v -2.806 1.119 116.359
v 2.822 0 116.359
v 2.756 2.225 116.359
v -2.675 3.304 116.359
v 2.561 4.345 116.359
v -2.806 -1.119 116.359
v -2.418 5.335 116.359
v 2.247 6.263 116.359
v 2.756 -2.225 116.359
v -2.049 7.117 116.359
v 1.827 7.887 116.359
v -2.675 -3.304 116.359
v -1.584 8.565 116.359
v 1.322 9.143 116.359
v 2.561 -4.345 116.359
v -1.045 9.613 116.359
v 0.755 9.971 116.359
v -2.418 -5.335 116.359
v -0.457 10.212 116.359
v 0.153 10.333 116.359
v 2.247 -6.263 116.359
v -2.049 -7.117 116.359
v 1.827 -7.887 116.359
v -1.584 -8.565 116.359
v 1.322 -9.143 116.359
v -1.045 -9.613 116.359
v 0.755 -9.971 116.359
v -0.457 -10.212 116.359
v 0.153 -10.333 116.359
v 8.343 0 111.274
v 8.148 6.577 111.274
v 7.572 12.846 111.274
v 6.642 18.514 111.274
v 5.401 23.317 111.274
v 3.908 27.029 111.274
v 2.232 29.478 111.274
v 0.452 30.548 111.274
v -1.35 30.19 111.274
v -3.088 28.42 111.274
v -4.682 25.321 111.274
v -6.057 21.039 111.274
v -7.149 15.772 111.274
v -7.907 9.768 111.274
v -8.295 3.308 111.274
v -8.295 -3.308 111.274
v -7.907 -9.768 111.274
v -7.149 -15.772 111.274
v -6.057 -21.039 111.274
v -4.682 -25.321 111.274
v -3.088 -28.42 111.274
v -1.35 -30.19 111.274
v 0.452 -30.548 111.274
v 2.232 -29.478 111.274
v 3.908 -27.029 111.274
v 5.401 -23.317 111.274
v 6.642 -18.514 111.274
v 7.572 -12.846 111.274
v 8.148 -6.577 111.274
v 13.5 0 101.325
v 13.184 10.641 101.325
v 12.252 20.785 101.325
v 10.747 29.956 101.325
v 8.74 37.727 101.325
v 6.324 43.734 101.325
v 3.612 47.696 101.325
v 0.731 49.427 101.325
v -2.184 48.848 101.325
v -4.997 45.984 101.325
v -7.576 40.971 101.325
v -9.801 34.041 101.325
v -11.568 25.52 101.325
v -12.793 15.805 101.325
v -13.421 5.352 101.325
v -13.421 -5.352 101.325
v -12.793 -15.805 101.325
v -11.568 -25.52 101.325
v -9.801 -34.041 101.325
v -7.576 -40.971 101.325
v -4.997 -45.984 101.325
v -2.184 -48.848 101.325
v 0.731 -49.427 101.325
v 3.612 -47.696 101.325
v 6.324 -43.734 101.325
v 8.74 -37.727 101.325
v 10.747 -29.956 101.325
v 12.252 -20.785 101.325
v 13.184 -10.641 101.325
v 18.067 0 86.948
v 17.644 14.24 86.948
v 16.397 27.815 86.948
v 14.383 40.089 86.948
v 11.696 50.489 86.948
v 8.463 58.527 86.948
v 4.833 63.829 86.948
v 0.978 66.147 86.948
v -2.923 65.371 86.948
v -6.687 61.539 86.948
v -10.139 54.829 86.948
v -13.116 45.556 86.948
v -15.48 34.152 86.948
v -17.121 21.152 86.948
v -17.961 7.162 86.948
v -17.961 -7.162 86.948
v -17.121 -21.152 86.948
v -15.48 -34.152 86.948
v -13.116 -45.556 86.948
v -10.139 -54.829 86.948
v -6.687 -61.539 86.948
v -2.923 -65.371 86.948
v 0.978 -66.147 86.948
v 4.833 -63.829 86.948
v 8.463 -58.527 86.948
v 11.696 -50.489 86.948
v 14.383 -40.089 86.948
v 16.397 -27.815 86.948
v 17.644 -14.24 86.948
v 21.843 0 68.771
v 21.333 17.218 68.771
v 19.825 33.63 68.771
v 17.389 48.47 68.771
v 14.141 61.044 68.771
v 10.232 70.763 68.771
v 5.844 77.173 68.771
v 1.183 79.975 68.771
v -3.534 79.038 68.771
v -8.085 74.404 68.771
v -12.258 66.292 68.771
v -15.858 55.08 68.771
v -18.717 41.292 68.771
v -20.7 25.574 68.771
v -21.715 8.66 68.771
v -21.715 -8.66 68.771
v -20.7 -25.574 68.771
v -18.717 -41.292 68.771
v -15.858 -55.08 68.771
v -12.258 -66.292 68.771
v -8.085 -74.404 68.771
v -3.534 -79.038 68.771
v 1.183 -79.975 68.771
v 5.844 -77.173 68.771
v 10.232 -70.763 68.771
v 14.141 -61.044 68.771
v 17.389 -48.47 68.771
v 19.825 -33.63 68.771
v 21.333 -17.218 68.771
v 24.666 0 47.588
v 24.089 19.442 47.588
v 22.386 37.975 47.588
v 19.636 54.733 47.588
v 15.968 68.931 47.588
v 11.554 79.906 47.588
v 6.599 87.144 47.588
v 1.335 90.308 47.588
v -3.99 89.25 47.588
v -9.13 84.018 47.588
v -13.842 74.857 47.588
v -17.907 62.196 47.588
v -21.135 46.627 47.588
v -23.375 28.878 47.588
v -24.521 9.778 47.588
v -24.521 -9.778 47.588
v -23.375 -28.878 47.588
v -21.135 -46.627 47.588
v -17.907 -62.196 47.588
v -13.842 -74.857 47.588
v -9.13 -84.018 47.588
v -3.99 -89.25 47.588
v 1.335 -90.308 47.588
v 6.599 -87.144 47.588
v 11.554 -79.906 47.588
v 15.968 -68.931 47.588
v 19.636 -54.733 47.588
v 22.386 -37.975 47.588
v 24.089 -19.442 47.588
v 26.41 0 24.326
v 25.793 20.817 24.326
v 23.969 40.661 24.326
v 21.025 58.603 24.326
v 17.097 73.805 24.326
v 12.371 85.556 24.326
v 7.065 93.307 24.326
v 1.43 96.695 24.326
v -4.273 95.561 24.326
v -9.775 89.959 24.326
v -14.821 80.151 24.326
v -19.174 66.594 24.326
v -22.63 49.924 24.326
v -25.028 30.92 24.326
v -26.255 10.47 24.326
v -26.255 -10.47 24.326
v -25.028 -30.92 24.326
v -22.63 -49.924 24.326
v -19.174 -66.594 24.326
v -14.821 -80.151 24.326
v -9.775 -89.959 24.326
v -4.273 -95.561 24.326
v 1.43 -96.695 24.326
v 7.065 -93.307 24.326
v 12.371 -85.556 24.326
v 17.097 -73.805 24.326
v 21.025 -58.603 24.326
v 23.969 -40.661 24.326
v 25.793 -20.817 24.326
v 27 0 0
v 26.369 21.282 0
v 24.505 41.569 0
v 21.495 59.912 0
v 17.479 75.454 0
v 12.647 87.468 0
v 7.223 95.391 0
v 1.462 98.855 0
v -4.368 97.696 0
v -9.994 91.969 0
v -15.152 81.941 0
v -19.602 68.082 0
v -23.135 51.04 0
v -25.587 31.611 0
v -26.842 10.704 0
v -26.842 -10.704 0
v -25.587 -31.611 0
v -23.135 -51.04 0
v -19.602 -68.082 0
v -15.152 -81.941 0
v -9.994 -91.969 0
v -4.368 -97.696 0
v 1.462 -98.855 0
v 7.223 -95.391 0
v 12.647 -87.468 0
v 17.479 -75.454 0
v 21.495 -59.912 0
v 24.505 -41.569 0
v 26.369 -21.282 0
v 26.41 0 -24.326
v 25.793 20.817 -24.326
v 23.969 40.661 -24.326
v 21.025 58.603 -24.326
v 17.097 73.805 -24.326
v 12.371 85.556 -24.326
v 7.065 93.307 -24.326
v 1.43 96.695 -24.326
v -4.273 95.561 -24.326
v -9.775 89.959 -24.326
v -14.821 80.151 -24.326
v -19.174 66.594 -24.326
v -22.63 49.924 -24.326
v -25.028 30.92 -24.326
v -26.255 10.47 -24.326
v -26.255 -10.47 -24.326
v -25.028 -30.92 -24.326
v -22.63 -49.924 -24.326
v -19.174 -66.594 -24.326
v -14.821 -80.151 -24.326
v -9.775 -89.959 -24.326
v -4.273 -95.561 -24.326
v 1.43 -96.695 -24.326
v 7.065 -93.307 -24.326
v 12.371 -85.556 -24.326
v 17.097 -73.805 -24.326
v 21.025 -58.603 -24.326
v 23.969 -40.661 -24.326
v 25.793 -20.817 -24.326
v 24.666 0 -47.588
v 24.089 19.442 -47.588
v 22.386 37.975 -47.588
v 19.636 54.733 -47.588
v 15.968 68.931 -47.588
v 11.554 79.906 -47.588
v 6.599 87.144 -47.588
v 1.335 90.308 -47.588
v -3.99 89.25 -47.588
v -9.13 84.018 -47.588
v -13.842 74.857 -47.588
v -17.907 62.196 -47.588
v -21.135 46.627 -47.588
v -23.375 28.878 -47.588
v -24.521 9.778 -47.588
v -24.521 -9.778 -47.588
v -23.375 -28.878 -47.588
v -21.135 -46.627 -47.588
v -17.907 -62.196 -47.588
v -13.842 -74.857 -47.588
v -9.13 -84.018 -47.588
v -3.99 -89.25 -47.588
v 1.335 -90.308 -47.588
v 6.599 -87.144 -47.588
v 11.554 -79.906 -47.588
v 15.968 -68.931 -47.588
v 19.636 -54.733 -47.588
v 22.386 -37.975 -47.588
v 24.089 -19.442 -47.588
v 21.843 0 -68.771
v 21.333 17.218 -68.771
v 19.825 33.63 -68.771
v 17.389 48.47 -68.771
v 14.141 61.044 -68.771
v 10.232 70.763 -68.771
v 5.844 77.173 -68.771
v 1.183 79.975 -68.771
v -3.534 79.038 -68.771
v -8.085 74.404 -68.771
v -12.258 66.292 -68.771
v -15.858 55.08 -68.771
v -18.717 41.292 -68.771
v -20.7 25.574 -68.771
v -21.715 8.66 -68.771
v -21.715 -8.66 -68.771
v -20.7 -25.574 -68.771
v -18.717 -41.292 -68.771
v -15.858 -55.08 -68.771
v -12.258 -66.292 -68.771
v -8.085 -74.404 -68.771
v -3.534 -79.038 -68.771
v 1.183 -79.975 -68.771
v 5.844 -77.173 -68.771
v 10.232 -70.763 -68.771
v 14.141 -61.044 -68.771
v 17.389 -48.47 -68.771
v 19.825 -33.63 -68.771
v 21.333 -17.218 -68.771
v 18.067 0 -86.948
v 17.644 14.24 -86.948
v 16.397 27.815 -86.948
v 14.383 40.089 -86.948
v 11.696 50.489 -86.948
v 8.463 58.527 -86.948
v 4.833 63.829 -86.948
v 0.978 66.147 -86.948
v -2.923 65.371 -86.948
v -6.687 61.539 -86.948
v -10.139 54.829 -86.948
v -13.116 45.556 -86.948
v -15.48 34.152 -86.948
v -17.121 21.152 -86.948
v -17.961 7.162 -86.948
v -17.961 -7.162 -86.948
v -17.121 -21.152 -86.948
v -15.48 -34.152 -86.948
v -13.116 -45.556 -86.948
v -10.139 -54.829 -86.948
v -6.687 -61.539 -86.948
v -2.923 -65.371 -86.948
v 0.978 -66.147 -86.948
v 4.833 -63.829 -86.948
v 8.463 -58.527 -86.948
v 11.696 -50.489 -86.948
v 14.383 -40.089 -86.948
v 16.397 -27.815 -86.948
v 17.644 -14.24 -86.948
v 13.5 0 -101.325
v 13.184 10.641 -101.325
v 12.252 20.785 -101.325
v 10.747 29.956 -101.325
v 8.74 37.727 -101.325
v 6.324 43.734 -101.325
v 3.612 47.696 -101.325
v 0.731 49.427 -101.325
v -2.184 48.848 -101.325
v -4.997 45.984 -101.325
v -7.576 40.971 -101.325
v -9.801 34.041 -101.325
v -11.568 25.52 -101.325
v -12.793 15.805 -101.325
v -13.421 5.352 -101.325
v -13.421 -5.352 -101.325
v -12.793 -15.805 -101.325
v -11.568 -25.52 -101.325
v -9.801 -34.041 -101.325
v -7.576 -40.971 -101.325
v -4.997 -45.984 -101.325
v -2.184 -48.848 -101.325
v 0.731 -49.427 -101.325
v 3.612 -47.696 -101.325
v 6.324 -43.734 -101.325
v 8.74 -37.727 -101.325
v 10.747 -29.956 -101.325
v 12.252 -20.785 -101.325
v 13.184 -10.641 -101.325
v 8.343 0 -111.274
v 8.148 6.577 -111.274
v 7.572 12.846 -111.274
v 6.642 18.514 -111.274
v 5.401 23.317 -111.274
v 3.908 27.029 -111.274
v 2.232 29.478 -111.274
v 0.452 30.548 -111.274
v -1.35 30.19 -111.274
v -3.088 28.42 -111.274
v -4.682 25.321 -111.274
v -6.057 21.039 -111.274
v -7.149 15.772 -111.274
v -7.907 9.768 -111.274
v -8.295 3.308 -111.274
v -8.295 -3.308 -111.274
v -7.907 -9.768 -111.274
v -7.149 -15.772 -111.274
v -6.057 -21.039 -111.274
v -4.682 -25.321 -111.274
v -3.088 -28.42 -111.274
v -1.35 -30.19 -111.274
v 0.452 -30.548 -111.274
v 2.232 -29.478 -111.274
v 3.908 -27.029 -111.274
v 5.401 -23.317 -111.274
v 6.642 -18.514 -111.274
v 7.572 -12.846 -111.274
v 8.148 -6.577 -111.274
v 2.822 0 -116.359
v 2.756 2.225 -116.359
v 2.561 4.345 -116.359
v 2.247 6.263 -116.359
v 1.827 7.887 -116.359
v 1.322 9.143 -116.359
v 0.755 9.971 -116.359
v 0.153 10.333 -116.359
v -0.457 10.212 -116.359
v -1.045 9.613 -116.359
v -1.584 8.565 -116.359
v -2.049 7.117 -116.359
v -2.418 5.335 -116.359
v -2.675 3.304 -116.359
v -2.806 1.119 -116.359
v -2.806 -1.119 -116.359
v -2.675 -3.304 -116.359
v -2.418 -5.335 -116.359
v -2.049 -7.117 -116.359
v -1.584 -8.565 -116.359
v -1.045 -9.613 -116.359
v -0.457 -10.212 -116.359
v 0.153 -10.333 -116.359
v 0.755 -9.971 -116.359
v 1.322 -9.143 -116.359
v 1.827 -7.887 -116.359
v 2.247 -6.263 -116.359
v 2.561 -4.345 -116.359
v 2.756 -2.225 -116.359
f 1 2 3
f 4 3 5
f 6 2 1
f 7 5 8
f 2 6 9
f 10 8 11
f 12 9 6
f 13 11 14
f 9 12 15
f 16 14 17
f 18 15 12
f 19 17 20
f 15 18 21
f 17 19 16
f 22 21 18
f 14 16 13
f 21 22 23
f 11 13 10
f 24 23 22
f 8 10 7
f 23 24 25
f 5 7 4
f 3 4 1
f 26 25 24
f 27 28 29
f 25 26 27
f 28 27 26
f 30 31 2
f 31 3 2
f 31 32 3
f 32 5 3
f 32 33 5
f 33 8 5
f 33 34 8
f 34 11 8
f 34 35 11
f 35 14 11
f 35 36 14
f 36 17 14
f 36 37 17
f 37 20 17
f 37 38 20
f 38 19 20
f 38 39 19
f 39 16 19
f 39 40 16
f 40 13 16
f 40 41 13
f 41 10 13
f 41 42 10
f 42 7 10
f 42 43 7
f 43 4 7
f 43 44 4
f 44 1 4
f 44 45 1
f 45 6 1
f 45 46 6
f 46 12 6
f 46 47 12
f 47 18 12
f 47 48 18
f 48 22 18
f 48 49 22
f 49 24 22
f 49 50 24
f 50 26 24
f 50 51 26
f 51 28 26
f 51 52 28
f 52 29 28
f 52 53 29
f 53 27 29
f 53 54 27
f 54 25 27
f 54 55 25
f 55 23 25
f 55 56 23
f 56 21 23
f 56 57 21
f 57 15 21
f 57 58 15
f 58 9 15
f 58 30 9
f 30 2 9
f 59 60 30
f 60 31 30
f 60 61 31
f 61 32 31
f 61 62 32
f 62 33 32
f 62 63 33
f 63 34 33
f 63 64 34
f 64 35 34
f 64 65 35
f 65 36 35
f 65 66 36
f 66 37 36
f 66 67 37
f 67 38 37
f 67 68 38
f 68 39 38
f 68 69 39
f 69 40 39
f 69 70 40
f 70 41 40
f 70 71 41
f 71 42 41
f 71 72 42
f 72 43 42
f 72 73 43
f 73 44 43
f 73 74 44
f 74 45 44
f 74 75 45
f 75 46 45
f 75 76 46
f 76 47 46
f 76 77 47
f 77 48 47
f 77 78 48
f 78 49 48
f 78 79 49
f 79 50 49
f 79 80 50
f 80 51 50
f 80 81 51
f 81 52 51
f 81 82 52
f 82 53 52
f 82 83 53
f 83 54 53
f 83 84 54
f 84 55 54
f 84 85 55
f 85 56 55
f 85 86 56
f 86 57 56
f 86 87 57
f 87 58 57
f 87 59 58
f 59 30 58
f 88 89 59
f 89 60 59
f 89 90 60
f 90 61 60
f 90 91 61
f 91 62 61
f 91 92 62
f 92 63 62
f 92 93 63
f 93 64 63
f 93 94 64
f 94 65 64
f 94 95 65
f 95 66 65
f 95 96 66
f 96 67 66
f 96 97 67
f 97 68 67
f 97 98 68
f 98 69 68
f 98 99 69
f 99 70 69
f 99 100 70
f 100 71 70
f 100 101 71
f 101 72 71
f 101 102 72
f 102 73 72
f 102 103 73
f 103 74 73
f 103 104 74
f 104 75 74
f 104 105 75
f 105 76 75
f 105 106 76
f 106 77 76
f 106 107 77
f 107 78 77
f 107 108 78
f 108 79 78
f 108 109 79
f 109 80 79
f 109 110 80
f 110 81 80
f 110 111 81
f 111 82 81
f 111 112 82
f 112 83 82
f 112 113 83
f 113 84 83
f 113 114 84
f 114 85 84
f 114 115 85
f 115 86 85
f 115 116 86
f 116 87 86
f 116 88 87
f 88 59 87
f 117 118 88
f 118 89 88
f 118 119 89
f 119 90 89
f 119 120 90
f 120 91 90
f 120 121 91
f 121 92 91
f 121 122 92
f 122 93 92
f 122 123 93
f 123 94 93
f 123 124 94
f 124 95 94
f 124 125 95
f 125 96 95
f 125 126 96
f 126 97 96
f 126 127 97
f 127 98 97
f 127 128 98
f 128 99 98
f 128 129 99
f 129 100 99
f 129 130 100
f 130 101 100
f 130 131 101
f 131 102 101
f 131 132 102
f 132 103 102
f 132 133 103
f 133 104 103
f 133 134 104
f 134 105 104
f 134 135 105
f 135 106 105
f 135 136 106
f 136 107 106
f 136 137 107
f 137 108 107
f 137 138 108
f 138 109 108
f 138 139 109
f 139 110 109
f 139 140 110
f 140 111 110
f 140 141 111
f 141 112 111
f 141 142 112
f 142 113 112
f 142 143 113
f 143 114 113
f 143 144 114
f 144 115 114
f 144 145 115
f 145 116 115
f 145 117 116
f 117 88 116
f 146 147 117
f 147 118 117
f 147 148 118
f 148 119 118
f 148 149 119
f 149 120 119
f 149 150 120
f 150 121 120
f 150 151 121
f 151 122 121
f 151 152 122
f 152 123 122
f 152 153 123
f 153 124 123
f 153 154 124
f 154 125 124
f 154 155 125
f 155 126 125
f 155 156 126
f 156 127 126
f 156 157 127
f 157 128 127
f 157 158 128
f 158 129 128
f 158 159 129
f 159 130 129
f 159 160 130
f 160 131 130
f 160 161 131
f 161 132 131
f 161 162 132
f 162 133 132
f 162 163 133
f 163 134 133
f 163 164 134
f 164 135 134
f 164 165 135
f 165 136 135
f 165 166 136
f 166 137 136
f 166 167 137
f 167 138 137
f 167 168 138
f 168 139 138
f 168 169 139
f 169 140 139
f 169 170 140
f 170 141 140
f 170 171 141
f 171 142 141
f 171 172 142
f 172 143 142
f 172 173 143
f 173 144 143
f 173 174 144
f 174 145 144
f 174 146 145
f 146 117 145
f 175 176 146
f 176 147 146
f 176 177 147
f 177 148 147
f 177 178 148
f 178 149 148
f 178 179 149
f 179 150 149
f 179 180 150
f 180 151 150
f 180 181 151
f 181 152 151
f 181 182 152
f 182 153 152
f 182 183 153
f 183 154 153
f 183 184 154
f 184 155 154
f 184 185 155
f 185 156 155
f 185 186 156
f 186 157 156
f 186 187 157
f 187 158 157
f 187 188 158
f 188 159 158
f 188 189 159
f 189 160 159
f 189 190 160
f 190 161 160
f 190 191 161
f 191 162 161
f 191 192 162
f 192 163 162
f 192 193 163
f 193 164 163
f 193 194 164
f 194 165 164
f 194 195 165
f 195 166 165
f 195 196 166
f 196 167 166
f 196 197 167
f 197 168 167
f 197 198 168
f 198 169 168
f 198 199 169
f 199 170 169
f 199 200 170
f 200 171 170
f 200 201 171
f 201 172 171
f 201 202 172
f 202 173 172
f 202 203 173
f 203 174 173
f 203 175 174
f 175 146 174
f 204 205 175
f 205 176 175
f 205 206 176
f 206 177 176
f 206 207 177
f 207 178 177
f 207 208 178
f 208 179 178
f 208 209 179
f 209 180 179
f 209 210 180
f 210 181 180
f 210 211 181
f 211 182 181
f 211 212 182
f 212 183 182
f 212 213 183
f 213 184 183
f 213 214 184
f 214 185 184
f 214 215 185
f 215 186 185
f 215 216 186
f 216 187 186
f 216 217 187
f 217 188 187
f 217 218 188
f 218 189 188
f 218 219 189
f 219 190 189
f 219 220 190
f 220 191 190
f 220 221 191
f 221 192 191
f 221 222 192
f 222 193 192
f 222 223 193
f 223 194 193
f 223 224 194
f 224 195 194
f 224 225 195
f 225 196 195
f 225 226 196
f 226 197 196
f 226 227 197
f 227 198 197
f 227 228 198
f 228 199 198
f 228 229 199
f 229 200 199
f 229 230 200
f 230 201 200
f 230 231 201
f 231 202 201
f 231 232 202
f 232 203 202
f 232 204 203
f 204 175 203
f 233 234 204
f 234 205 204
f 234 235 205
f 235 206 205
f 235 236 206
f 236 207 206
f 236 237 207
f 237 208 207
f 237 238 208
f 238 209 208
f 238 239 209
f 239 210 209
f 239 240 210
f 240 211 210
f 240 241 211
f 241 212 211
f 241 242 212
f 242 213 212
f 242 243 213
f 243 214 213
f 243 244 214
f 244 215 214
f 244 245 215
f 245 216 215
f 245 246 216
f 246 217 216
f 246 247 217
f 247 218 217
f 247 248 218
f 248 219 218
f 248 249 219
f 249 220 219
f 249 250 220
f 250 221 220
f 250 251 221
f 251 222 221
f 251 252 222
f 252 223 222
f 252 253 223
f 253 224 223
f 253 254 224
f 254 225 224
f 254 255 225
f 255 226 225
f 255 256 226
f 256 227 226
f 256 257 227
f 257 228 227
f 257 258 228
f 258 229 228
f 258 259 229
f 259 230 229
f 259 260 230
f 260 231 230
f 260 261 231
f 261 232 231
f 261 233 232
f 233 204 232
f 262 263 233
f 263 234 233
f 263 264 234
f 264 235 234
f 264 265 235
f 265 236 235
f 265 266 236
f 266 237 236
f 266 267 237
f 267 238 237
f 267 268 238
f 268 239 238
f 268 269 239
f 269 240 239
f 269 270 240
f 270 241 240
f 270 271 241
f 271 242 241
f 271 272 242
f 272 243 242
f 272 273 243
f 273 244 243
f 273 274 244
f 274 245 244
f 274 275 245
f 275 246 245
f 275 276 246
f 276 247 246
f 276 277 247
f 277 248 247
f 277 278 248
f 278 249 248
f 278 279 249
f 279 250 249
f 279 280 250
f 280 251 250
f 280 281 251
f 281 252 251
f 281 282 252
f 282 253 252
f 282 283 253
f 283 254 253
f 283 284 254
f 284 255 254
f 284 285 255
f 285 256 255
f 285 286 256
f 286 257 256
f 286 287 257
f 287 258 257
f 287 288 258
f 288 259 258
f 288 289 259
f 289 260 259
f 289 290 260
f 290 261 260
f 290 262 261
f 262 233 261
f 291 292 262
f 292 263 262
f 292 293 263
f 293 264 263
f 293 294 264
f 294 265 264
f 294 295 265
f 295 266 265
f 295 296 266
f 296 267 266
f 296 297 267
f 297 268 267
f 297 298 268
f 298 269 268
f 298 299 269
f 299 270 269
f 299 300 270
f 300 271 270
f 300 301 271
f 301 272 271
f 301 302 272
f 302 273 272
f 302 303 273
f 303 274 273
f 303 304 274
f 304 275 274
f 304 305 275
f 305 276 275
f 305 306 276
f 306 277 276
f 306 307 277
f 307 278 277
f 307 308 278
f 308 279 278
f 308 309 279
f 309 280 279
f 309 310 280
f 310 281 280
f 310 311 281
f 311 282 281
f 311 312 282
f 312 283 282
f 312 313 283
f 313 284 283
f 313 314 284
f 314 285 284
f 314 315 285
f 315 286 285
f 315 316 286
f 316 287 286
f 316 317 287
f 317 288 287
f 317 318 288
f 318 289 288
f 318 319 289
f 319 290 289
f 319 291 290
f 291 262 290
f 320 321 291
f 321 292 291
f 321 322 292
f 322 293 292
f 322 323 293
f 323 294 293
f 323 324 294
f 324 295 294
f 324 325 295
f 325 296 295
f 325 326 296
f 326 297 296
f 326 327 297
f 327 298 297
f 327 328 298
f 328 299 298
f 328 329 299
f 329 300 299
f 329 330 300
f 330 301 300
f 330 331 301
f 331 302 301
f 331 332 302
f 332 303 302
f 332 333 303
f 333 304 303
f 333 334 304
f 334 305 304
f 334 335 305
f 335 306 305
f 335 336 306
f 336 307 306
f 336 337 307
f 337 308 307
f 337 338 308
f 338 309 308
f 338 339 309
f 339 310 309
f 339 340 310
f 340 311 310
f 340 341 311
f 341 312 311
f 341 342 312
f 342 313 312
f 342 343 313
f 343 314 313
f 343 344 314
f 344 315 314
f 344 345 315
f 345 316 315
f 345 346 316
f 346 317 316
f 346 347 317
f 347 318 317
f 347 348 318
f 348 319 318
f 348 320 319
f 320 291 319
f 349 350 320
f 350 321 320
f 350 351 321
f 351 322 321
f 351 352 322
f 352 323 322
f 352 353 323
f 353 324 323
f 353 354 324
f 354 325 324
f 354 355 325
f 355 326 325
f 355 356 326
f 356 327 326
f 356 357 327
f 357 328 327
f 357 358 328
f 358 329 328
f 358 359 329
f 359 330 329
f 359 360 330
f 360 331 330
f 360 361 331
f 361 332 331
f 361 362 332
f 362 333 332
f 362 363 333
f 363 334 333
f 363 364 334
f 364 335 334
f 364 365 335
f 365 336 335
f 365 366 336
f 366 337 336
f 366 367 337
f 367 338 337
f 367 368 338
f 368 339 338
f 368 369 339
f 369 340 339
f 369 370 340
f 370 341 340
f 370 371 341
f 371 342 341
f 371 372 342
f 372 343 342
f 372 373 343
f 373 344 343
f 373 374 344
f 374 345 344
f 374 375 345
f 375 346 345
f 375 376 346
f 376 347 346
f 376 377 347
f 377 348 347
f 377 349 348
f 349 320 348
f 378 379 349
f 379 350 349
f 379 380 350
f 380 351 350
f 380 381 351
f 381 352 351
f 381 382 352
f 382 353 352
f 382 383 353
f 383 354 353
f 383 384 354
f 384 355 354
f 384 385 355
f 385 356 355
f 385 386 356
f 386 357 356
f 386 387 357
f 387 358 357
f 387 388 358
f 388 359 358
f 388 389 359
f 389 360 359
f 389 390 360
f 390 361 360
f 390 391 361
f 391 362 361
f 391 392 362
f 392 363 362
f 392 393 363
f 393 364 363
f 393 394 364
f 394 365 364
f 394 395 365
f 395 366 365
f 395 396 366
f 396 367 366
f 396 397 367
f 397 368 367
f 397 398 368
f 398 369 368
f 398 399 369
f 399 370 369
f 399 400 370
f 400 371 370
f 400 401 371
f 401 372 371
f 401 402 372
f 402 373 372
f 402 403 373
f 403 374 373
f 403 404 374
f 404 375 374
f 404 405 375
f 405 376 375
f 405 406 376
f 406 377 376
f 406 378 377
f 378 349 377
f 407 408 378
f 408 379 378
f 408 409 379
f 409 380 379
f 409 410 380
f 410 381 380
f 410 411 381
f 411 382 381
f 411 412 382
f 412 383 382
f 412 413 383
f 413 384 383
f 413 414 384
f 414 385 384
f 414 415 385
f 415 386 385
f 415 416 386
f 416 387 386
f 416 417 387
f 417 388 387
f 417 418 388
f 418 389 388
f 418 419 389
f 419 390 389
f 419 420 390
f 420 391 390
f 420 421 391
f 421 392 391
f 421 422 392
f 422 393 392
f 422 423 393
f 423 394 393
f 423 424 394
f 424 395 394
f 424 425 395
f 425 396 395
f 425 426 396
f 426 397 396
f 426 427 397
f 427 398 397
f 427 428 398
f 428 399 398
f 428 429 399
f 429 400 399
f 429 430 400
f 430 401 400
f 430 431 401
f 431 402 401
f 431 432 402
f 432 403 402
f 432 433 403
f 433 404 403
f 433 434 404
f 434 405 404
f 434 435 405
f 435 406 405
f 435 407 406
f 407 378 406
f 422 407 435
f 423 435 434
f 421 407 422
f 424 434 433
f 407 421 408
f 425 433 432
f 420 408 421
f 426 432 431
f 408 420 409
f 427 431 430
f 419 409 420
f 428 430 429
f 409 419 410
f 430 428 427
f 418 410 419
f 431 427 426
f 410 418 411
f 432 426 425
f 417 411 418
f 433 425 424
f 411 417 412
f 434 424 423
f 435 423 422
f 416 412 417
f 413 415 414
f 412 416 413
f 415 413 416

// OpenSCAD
// Generated by SolidPython 1.0.1 on 2020-07-29 00:46:45


scale(v = [3, 11, 13]) {
	sphere(r = 9);
}
/***********************************************
*********      SolidPython code:      **********
************************************************
 
# import packages: SolidPython
from solid import *
from solid.utils import *
from itertools import chain, combinations, permutations


class Resize:

    def __init__(self, scad_file):
        self.scad_file = scad_file
        #self.scad_file = import_scad(scad_file)
        # cone/cylinder param:
        self.r1 = 0
        self.r2 = 0
        self.h = 0
        # rectangular prism param:
        self.w = 0
        self.l = 0
        # ellipse param:
        self.r = 0

    # import OpenScad code (file name corresponds to shape)


    # classify shape + parameters
    def assign(self, param1, param2, param3):
        if self.scad_file == 'cone.scad':
            self.r1 = param1
            self.r2 = param2
            self.h = param3
        elif self.scad_file == 'cylinder.scad':
            self.r1 = param1
            self.r2 = param2
            self.h = param3
        elif self.scad_file == 'rectangularPrism.scad':
            self.h = param1
            self.l = param2
            self.w = param3
        else:
            self.r = param1
            self.h = param2

    # resize parameters
    def iterate(self):
        x = range(3, 20, 2)
        i = 1
        if self.scad_file == 'cone.scad':
            tempList = list(permutations(x, 2))
            for temp in tempList:
                param1 = temp[0]
                param2 = temp[1]
                filepath = 'produced_scad_files/' + 'cone' + str(param1) + '_' + str(param2) + '_' + '.scad'
                scad_render_to_file(cylinder(h=param1, r1=param2, r2=0), filepath)

        elif self.scad_file == 'cylinder.scad':
            tempList = list(permutations(x, 3))
            for temp in tempList:
                param1 = temp[0]
                param2 = temp[1]
                filepath = 'produced_scad_files/' + 'cylinder' + str(param1) + '_' + str(param2) + '_' + '.scad'
                scad_render_to_file(cylinder(h=param1, r1=param2, r2=param2), filepath)

        elif self.scad_file == 'rectangularPrism.scad':
            tempList = list(permutations(x, 3))
            for temp in tempList:
                param1 = temp[0]
                param2 = temp[1]
                param3 = temp[2]
                filepath = 'produced_scad_files/' + 'rectangularPrism' + str(param1) + '_' + str(param2) + '_' + str(
                    param3) + '.scad'
                scad_render_to_file(cube(size=(param1, param2, param3)), filepath)

        elif self.scad_file == 'ellipse.scad':
            tempList = list(permutations(x, 4))
            for temp in tempList:
                param1 = temp[0]
                param2 = temp[1]
                param3 = temp[2]
                param4 = temp[3]
                filepath = 'produced_scad_files/' + 'ellipse' + str(param1) + '_' + str(param2) + '_' + str(param3) + '_' + str(param4) + '.scad'
                scad_render_to_file(scale([param1, param2, param3])(sphere(r=param4)), filepath)

    def render_to_scadfile(self):
        scad_render_to_file(scad, 'example.scad') 
 
************************************************/
